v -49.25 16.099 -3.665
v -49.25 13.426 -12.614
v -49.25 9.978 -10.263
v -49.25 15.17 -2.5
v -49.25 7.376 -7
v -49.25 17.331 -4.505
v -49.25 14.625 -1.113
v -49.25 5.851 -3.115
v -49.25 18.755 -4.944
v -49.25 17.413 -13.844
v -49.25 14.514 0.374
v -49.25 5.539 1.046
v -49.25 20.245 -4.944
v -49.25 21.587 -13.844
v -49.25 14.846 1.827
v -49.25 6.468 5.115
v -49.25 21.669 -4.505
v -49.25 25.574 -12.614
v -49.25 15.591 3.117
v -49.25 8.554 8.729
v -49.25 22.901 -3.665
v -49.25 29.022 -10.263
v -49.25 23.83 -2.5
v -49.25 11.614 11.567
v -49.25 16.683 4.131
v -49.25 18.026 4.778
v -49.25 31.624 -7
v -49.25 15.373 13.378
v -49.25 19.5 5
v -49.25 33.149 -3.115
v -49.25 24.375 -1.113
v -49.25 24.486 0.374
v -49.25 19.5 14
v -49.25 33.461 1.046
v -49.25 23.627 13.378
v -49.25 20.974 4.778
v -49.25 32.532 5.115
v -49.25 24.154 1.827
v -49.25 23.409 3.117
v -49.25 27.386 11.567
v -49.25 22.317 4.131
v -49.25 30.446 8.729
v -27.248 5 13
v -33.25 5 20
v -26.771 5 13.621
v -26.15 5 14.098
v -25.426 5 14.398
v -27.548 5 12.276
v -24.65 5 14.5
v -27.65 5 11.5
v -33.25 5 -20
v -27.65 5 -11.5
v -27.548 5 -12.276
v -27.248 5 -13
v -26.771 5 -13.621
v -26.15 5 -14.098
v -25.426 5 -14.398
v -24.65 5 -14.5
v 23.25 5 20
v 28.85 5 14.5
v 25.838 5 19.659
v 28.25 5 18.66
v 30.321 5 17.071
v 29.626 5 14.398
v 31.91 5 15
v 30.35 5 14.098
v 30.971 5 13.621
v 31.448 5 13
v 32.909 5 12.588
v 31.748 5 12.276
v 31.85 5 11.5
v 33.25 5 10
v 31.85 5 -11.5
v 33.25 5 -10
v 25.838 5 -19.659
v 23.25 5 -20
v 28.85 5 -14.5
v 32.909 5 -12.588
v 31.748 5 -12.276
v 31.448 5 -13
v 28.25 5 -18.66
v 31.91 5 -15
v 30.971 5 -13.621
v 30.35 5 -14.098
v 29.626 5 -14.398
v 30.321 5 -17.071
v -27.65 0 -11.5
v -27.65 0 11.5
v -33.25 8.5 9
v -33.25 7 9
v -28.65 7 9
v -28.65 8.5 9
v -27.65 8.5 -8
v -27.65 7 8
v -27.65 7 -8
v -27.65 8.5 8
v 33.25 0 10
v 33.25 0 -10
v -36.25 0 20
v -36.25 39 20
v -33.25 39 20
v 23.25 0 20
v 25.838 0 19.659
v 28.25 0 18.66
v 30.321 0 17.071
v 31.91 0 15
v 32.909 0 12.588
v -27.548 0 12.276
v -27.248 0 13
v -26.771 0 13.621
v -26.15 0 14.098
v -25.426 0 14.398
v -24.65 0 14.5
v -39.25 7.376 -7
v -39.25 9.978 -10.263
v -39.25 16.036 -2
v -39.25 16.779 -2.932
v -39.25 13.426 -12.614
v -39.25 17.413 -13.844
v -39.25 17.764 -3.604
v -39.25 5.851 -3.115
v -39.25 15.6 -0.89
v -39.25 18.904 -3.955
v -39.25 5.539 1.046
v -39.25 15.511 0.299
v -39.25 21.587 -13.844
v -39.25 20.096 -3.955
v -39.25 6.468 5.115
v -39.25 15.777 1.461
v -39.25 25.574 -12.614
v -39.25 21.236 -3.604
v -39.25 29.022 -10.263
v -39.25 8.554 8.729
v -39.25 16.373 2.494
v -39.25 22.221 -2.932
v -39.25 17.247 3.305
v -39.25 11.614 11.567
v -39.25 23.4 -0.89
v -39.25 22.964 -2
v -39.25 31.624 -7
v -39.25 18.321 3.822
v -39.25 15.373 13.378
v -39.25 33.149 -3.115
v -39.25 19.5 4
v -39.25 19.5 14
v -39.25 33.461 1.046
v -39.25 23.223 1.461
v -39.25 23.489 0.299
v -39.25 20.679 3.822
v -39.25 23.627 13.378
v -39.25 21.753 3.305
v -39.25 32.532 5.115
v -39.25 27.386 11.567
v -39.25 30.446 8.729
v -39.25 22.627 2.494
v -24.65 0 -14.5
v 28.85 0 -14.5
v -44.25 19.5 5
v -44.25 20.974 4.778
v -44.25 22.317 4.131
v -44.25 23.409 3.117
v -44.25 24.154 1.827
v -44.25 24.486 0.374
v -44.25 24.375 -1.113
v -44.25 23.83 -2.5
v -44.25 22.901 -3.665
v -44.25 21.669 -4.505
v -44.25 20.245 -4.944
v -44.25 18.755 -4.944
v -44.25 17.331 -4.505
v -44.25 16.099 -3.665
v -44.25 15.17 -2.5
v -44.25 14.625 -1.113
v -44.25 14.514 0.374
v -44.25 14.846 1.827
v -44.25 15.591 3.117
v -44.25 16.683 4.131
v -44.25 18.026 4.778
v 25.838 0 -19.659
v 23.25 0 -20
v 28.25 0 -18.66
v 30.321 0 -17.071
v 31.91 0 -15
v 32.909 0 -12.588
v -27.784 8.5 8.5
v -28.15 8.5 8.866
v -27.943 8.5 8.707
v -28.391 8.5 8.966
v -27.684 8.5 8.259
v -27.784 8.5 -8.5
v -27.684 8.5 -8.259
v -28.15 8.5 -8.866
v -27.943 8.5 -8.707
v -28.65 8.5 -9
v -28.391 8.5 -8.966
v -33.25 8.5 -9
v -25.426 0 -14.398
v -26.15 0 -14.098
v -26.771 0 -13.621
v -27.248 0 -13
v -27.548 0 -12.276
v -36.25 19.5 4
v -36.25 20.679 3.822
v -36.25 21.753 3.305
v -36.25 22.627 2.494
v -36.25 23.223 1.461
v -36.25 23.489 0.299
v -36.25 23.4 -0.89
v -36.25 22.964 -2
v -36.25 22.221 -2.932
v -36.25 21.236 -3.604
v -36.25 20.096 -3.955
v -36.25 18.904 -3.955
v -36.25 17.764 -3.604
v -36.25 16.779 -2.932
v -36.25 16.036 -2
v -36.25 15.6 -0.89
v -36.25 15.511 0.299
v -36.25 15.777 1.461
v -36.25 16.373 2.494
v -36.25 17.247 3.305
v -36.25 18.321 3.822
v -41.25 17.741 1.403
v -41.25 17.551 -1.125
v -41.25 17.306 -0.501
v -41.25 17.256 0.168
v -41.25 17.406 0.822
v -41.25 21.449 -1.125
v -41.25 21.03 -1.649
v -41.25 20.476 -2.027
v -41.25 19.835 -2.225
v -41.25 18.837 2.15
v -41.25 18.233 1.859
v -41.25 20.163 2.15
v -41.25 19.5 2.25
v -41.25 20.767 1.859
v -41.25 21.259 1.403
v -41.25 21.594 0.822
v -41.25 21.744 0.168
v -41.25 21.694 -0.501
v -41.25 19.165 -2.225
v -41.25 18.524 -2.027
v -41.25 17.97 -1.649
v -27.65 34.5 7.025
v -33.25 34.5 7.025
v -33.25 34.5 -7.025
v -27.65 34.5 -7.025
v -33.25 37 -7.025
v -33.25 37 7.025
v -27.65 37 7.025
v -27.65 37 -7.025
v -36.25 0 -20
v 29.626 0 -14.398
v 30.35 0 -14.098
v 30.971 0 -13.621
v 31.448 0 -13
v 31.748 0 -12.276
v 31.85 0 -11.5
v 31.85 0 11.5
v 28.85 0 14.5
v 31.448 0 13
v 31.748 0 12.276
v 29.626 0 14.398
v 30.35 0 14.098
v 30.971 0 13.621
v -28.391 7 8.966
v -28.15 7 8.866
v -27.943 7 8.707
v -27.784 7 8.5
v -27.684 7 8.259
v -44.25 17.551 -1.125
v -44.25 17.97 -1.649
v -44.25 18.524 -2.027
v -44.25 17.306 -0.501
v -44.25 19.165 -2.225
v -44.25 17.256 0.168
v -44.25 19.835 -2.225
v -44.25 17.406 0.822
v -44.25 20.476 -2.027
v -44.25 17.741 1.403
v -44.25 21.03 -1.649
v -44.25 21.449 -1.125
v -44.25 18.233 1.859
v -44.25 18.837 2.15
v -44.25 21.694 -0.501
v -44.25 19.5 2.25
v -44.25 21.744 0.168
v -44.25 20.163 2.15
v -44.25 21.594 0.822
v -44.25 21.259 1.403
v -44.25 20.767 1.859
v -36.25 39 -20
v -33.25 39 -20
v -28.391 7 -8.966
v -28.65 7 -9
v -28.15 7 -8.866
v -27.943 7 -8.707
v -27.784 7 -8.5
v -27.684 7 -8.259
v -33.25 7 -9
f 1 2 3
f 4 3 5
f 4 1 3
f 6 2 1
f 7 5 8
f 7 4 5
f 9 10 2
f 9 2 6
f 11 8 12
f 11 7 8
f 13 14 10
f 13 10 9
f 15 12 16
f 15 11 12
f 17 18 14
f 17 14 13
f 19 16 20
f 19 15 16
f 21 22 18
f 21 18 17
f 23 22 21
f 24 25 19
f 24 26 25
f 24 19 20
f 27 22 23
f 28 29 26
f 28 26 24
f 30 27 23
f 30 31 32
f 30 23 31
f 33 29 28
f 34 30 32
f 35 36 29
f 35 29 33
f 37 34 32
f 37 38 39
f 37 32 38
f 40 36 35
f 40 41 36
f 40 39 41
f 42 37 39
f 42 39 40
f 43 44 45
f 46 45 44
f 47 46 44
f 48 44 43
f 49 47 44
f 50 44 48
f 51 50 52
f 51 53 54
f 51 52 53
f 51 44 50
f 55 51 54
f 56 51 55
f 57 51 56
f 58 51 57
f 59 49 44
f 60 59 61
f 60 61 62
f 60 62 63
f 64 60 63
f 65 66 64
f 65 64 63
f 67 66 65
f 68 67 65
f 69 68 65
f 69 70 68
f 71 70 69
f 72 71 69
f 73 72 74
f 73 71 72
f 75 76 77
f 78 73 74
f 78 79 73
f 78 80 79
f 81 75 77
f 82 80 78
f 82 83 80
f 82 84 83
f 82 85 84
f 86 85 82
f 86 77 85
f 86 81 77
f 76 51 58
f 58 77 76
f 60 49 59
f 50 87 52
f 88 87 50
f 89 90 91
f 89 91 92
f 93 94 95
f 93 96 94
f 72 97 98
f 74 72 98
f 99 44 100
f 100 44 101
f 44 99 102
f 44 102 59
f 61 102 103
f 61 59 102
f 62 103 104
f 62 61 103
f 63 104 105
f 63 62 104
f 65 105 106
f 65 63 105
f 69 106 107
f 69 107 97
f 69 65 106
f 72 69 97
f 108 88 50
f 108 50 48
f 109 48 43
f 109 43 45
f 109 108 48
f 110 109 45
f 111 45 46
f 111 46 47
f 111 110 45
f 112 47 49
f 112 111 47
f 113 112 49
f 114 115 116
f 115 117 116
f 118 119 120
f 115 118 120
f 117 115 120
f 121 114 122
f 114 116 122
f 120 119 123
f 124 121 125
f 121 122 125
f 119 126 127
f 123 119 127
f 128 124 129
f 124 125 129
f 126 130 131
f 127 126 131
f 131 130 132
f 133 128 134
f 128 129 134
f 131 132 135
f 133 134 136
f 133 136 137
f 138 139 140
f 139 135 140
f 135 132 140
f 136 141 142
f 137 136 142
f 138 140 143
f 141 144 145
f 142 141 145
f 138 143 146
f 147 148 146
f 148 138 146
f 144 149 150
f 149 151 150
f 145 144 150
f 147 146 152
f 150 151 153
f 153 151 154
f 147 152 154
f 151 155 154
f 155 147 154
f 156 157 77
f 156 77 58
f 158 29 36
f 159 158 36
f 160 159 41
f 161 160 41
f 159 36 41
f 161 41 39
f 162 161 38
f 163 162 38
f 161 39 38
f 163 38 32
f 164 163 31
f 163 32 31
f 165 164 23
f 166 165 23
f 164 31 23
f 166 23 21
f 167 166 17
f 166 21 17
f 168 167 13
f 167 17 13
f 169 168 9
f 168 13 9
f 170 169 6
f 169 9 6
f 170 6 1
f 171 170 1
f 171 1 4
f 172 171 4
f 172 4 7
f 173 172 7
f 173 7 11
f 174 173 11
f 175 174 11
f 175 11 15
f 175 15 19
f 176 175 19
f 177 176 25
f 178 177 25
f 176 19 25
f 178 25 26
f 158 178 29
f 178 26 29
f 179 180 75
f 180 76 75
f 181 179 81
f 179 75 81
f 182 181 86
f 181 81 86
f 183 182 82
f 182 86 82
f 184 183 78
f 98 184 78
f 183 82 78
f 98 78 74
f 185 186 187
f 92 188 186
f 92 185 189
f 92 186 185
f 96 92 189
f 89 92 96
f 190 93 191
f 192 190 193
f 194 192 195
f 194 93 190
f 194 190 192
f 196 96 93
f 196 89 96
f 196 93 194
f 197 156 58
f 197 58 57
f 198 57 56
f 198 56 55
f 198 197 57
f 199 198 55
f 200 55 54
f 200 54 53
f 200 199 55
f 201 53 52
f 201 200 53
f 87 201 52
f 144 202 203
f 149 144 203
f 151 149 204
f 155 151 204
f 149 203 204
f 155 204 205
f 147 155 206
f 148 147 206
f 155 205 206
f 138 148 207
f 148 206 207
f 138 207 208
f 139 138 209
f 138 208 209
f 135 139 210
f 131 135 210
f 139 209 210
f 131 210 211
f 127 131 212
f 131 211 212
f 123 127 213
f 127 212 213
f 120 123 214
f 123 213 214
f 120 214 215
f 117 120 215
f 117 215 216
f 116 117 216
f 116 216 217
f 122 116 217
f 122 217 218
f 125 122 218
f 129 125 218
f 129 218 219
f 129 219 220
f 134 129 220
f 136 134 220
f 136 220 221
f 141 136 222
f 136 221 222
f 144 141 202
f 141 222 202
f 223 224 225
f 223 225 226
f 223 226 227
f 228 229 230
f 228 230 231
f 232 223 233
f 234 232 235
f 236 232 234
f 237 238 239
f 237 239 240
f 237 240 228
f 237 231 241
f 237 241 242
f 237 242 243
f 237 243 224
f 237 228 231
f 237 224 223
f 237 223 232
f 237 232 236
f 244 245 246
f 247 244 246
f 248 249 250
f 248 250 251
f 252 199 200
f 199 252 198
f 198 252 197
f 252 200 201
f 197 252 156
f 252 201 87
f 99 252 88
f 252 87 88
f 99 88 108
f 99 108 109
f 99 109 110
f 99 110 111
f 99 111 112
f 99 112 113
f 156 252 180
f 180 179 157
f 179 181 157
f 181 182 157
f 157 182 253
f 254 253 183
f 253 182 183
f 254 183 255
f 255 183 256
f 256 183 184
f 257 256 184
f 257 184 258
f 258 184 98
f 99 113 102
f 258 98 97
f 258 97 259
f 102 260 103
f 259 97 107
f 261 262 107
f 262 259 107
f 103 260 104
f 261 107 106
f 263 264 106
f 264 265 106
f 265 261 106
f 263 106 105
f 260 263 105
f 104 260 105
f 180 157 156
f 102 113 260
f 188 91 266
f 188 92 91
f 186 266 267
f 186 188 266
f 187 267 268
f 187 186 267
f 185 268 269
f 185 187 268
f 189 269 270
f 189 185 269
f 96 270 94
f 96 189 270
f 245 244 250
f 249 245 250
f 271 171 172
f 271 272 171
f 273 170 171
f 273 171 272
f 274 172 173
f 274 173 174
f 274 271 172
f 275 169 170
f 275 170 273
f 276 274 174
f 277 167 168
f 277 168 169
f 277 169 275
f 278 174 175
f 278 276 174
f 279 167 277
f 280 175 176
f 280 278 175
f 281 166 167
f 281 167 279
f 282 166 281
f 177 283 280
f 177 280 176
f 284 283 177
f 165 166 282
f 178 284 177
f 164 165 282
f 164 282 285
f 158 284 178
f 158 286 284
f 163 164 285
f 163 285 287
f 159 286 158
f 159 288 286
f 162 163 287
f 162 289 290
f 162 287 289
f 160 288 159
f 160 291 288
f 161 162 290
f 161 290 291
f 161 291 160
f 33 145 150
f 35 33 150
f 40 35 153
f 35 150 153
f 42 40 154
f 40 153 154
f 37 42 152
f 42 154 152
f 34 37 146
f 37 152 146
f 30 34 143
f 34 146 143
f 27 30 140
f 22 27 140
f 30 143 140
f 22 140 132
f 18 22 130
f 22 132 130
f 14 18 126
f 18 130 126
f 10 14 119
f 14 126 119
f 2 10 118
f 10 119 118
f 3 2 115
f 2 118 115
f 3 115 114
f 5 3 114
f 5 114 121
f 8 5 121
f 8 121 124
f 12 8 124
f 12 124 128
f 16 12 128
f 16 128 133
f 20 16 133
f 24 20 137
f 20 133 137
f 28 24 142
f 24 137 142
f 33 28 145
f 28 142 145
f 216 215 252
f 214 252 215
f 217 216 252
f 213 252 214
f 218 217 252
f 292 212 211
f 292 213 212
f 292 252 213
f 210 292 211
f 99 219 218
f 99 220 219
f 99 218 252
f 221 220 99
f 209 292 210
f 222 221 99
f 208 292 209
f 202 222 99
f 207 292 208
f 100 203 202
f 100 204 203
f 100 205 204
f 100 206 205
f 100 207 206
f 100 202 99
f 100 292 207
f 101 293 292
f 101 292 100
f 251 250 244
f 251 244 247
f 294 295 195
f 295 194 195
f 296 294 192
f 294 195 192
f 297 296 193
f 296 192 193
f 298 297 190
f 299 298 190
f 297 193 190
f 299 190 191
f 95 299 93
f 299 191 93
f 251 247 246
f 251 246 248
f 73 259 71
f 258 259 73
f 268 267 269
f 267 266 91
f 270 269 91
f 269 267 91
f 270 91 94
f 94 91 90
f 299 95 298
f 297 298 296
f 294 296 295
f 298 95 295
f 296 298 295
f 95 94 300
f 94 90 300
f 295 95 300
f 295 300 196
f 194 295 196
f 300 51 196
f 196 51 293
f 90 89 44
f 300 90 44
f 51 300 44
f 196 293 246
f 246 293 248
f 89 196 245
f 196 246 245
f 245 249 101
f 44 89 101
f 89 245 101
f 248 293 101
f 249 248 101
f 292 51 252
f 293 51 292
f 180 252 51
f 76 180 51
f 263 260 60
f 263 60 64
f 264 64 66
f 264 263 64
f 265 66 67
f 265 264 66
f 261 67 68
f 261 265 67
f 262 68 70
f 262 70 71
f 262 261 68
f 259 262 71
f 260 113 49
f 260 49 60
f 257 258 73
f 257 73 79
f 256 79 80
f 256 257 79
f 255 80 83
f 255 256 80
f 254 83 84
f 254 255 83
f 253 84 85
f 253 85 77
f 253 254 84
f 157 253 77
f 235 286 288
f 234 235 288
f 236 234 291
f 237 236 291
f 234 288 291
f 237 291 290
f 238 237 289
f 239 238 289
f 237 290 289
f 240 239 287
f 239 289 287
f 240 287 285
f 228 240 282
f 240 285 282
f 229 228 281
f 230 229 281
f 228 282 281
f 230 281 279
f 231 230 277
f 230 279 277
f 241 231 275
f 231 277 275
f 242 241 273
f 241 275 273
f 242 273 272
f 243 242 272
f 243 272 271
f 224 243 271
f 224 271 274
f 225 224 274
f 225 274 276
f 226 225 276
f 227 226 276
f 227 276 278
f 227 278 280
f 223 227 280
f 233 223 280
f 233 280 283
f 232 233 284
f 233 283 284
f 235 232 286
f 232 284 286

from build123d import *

# Parameters (mm, degrees)
SKETCH2_W           = 66.5
SKETCH2_H           = 40
BOSS_EXTRUDE1_DEPTH = 5
SKETCH5_W           = 40
SKETCH5_H           = 39
BOSS_EXTRUDE3_DEPTH = 3
SKETCH11_W          = 14.05
SKETCH11_H          = 2.5
SKETCH11_W_2        = 18
SKETCH11_H_2        = 1.5
BOSS_EXTRUDE4_DEPTH = 5.6
FILLET4_R           = 1
SKETCH12_R          = 4
BOSS_EXTRUDE5_DEPTH = 3
FILLET6_R           = 10
SKETCH13_R          = 14
BOSS_EXTRUDE6_DEPTH = 10
SKETCH14_R          = 5
CUT_EXTRUDE1_DEPTH  = 5
SKETCH15_R          = 2.25
CUT_EXTRUDE2_DEPTH  = 3


with BuildPart() as part:
    # Sketch2 → Boss-Extrude1 (new body)
    with BuildSketch(Plane(origin=(0, 0, 0), x_dir=(1, 0, 0), z_dir=(0, 1, 0))):
        Rectangle(SKETCH2_W, SKETCH2_H)
        with BuildLine():
            Line((-27.65, 11.5), (-27.65, -11.5))
            ThreePointArc((-27.65, -11.5), (-26.771320344, -13.621320344), (-24.65, -14.5))
            Line((-24.65, -14.5), (28.85, -14.5))
            ThreePointArc((28.85, -14.5), (30.971320344, -13.621320344), (31.85, -11.5))
            Line((31.85, -11.5), (31.85, 11.5))
            ThreePointArc((31.85, 11.5), (30.971320344, 13.621320344), (28.85, 14.5))
            Line((28.85, 14.5), (-24.65, 14.5))
            ThreePointArc((-24.65, 14.5), (-26.771320344, 13.621320344), (-27.65, 11.5))
        make_face(mode=Mode.SUBTRACT)
    extrude(amount=BOSS_EXTRUDE1_DEPTH)

    # Sketch5 → Boss-Extrude3 (add)
    with BuildSketch(Plane.ZY.offset(33.25)):
        with Locations((0, 19.5)):
            Rectangle(SKETCH5_W, SKETCH5_H)
    extrude(amount=BOSS_EXTRUDE3_DEPTH)

    # Sketch11 → Boss-Extrude4 (add)
    with BuildSketch(Plane(origin=(-33.25, 0, 0), x_dir=(0, 0, -1), z_dir=(1, 0, 0))):
        with Locations((0, 35.75)):
            Rectangle(SKETCH11_W, SKETCH11_H)
        with Locations((0, 7.75)):
            Rectangle(SKETCH11_W_2, SKETCH11_H_2)
    extrude(amount=BOSS_EXTRUDE4_DEPTH)

    # Fillet4
    fillet4_edges = [part.edges().sort_by_distance(p)[0] for p in [
        (-27.65, 7.75, -9),
        (-27.65, 7.75, 9),
    ]]
    fillet(fillet4_edges, radius=FILLET4_R)

    # Sketch12 → Boss-Extrude5 (add)
    with BuildSketch(Plane.ZY.offset(36.25)):
        with Locations((0, 19.5)):
            Circle(SKETCH12_R)
    extrude(amount=BOSS_EXTRUDE5_DEPTH)

    # Fillet6
    fillet6_edges = [part.edges().sort_by_distance(p)[0] for p in [
        (33.25, 2.5, 20),
        (33.25, 2.5, -20),
    ]]
    fillet(fillet6_edges, radius=FILLET6_R)

    # Sketch13 → Boss-Extrude6 (add)
    with BuildSketch(Plane.ZY.offset(39.25)):
        with Locations((0, 19.5)):
            Circle(SKETCH13_R)
    extrude(amount=BOSS_EXTRUDE6_DEPTH)

    # Sketch14 → Cut-Extrude1 (cut)
    with BuildSketch(Plane.ZY.offset(49.25)):
        with Locations((0, 19.5)):
            Circle(SKETCH14_R)
    extrude(amount=-CUT_EXTRUDE1_DEPTH, mode=Mode.SUBTRACT)

    # Sketch15 → Cut-Extrude2 (cut)
    with BuildSketch(Plane.ZY.offset(44.25)):
        with Locations((0, 19.5)):
            Circle(SKETCH15_R)
    extrude(amount=-CUT_EXTRUDE2_DEPTH, mode=Mode.SUBTRACT)


solid = part.part
